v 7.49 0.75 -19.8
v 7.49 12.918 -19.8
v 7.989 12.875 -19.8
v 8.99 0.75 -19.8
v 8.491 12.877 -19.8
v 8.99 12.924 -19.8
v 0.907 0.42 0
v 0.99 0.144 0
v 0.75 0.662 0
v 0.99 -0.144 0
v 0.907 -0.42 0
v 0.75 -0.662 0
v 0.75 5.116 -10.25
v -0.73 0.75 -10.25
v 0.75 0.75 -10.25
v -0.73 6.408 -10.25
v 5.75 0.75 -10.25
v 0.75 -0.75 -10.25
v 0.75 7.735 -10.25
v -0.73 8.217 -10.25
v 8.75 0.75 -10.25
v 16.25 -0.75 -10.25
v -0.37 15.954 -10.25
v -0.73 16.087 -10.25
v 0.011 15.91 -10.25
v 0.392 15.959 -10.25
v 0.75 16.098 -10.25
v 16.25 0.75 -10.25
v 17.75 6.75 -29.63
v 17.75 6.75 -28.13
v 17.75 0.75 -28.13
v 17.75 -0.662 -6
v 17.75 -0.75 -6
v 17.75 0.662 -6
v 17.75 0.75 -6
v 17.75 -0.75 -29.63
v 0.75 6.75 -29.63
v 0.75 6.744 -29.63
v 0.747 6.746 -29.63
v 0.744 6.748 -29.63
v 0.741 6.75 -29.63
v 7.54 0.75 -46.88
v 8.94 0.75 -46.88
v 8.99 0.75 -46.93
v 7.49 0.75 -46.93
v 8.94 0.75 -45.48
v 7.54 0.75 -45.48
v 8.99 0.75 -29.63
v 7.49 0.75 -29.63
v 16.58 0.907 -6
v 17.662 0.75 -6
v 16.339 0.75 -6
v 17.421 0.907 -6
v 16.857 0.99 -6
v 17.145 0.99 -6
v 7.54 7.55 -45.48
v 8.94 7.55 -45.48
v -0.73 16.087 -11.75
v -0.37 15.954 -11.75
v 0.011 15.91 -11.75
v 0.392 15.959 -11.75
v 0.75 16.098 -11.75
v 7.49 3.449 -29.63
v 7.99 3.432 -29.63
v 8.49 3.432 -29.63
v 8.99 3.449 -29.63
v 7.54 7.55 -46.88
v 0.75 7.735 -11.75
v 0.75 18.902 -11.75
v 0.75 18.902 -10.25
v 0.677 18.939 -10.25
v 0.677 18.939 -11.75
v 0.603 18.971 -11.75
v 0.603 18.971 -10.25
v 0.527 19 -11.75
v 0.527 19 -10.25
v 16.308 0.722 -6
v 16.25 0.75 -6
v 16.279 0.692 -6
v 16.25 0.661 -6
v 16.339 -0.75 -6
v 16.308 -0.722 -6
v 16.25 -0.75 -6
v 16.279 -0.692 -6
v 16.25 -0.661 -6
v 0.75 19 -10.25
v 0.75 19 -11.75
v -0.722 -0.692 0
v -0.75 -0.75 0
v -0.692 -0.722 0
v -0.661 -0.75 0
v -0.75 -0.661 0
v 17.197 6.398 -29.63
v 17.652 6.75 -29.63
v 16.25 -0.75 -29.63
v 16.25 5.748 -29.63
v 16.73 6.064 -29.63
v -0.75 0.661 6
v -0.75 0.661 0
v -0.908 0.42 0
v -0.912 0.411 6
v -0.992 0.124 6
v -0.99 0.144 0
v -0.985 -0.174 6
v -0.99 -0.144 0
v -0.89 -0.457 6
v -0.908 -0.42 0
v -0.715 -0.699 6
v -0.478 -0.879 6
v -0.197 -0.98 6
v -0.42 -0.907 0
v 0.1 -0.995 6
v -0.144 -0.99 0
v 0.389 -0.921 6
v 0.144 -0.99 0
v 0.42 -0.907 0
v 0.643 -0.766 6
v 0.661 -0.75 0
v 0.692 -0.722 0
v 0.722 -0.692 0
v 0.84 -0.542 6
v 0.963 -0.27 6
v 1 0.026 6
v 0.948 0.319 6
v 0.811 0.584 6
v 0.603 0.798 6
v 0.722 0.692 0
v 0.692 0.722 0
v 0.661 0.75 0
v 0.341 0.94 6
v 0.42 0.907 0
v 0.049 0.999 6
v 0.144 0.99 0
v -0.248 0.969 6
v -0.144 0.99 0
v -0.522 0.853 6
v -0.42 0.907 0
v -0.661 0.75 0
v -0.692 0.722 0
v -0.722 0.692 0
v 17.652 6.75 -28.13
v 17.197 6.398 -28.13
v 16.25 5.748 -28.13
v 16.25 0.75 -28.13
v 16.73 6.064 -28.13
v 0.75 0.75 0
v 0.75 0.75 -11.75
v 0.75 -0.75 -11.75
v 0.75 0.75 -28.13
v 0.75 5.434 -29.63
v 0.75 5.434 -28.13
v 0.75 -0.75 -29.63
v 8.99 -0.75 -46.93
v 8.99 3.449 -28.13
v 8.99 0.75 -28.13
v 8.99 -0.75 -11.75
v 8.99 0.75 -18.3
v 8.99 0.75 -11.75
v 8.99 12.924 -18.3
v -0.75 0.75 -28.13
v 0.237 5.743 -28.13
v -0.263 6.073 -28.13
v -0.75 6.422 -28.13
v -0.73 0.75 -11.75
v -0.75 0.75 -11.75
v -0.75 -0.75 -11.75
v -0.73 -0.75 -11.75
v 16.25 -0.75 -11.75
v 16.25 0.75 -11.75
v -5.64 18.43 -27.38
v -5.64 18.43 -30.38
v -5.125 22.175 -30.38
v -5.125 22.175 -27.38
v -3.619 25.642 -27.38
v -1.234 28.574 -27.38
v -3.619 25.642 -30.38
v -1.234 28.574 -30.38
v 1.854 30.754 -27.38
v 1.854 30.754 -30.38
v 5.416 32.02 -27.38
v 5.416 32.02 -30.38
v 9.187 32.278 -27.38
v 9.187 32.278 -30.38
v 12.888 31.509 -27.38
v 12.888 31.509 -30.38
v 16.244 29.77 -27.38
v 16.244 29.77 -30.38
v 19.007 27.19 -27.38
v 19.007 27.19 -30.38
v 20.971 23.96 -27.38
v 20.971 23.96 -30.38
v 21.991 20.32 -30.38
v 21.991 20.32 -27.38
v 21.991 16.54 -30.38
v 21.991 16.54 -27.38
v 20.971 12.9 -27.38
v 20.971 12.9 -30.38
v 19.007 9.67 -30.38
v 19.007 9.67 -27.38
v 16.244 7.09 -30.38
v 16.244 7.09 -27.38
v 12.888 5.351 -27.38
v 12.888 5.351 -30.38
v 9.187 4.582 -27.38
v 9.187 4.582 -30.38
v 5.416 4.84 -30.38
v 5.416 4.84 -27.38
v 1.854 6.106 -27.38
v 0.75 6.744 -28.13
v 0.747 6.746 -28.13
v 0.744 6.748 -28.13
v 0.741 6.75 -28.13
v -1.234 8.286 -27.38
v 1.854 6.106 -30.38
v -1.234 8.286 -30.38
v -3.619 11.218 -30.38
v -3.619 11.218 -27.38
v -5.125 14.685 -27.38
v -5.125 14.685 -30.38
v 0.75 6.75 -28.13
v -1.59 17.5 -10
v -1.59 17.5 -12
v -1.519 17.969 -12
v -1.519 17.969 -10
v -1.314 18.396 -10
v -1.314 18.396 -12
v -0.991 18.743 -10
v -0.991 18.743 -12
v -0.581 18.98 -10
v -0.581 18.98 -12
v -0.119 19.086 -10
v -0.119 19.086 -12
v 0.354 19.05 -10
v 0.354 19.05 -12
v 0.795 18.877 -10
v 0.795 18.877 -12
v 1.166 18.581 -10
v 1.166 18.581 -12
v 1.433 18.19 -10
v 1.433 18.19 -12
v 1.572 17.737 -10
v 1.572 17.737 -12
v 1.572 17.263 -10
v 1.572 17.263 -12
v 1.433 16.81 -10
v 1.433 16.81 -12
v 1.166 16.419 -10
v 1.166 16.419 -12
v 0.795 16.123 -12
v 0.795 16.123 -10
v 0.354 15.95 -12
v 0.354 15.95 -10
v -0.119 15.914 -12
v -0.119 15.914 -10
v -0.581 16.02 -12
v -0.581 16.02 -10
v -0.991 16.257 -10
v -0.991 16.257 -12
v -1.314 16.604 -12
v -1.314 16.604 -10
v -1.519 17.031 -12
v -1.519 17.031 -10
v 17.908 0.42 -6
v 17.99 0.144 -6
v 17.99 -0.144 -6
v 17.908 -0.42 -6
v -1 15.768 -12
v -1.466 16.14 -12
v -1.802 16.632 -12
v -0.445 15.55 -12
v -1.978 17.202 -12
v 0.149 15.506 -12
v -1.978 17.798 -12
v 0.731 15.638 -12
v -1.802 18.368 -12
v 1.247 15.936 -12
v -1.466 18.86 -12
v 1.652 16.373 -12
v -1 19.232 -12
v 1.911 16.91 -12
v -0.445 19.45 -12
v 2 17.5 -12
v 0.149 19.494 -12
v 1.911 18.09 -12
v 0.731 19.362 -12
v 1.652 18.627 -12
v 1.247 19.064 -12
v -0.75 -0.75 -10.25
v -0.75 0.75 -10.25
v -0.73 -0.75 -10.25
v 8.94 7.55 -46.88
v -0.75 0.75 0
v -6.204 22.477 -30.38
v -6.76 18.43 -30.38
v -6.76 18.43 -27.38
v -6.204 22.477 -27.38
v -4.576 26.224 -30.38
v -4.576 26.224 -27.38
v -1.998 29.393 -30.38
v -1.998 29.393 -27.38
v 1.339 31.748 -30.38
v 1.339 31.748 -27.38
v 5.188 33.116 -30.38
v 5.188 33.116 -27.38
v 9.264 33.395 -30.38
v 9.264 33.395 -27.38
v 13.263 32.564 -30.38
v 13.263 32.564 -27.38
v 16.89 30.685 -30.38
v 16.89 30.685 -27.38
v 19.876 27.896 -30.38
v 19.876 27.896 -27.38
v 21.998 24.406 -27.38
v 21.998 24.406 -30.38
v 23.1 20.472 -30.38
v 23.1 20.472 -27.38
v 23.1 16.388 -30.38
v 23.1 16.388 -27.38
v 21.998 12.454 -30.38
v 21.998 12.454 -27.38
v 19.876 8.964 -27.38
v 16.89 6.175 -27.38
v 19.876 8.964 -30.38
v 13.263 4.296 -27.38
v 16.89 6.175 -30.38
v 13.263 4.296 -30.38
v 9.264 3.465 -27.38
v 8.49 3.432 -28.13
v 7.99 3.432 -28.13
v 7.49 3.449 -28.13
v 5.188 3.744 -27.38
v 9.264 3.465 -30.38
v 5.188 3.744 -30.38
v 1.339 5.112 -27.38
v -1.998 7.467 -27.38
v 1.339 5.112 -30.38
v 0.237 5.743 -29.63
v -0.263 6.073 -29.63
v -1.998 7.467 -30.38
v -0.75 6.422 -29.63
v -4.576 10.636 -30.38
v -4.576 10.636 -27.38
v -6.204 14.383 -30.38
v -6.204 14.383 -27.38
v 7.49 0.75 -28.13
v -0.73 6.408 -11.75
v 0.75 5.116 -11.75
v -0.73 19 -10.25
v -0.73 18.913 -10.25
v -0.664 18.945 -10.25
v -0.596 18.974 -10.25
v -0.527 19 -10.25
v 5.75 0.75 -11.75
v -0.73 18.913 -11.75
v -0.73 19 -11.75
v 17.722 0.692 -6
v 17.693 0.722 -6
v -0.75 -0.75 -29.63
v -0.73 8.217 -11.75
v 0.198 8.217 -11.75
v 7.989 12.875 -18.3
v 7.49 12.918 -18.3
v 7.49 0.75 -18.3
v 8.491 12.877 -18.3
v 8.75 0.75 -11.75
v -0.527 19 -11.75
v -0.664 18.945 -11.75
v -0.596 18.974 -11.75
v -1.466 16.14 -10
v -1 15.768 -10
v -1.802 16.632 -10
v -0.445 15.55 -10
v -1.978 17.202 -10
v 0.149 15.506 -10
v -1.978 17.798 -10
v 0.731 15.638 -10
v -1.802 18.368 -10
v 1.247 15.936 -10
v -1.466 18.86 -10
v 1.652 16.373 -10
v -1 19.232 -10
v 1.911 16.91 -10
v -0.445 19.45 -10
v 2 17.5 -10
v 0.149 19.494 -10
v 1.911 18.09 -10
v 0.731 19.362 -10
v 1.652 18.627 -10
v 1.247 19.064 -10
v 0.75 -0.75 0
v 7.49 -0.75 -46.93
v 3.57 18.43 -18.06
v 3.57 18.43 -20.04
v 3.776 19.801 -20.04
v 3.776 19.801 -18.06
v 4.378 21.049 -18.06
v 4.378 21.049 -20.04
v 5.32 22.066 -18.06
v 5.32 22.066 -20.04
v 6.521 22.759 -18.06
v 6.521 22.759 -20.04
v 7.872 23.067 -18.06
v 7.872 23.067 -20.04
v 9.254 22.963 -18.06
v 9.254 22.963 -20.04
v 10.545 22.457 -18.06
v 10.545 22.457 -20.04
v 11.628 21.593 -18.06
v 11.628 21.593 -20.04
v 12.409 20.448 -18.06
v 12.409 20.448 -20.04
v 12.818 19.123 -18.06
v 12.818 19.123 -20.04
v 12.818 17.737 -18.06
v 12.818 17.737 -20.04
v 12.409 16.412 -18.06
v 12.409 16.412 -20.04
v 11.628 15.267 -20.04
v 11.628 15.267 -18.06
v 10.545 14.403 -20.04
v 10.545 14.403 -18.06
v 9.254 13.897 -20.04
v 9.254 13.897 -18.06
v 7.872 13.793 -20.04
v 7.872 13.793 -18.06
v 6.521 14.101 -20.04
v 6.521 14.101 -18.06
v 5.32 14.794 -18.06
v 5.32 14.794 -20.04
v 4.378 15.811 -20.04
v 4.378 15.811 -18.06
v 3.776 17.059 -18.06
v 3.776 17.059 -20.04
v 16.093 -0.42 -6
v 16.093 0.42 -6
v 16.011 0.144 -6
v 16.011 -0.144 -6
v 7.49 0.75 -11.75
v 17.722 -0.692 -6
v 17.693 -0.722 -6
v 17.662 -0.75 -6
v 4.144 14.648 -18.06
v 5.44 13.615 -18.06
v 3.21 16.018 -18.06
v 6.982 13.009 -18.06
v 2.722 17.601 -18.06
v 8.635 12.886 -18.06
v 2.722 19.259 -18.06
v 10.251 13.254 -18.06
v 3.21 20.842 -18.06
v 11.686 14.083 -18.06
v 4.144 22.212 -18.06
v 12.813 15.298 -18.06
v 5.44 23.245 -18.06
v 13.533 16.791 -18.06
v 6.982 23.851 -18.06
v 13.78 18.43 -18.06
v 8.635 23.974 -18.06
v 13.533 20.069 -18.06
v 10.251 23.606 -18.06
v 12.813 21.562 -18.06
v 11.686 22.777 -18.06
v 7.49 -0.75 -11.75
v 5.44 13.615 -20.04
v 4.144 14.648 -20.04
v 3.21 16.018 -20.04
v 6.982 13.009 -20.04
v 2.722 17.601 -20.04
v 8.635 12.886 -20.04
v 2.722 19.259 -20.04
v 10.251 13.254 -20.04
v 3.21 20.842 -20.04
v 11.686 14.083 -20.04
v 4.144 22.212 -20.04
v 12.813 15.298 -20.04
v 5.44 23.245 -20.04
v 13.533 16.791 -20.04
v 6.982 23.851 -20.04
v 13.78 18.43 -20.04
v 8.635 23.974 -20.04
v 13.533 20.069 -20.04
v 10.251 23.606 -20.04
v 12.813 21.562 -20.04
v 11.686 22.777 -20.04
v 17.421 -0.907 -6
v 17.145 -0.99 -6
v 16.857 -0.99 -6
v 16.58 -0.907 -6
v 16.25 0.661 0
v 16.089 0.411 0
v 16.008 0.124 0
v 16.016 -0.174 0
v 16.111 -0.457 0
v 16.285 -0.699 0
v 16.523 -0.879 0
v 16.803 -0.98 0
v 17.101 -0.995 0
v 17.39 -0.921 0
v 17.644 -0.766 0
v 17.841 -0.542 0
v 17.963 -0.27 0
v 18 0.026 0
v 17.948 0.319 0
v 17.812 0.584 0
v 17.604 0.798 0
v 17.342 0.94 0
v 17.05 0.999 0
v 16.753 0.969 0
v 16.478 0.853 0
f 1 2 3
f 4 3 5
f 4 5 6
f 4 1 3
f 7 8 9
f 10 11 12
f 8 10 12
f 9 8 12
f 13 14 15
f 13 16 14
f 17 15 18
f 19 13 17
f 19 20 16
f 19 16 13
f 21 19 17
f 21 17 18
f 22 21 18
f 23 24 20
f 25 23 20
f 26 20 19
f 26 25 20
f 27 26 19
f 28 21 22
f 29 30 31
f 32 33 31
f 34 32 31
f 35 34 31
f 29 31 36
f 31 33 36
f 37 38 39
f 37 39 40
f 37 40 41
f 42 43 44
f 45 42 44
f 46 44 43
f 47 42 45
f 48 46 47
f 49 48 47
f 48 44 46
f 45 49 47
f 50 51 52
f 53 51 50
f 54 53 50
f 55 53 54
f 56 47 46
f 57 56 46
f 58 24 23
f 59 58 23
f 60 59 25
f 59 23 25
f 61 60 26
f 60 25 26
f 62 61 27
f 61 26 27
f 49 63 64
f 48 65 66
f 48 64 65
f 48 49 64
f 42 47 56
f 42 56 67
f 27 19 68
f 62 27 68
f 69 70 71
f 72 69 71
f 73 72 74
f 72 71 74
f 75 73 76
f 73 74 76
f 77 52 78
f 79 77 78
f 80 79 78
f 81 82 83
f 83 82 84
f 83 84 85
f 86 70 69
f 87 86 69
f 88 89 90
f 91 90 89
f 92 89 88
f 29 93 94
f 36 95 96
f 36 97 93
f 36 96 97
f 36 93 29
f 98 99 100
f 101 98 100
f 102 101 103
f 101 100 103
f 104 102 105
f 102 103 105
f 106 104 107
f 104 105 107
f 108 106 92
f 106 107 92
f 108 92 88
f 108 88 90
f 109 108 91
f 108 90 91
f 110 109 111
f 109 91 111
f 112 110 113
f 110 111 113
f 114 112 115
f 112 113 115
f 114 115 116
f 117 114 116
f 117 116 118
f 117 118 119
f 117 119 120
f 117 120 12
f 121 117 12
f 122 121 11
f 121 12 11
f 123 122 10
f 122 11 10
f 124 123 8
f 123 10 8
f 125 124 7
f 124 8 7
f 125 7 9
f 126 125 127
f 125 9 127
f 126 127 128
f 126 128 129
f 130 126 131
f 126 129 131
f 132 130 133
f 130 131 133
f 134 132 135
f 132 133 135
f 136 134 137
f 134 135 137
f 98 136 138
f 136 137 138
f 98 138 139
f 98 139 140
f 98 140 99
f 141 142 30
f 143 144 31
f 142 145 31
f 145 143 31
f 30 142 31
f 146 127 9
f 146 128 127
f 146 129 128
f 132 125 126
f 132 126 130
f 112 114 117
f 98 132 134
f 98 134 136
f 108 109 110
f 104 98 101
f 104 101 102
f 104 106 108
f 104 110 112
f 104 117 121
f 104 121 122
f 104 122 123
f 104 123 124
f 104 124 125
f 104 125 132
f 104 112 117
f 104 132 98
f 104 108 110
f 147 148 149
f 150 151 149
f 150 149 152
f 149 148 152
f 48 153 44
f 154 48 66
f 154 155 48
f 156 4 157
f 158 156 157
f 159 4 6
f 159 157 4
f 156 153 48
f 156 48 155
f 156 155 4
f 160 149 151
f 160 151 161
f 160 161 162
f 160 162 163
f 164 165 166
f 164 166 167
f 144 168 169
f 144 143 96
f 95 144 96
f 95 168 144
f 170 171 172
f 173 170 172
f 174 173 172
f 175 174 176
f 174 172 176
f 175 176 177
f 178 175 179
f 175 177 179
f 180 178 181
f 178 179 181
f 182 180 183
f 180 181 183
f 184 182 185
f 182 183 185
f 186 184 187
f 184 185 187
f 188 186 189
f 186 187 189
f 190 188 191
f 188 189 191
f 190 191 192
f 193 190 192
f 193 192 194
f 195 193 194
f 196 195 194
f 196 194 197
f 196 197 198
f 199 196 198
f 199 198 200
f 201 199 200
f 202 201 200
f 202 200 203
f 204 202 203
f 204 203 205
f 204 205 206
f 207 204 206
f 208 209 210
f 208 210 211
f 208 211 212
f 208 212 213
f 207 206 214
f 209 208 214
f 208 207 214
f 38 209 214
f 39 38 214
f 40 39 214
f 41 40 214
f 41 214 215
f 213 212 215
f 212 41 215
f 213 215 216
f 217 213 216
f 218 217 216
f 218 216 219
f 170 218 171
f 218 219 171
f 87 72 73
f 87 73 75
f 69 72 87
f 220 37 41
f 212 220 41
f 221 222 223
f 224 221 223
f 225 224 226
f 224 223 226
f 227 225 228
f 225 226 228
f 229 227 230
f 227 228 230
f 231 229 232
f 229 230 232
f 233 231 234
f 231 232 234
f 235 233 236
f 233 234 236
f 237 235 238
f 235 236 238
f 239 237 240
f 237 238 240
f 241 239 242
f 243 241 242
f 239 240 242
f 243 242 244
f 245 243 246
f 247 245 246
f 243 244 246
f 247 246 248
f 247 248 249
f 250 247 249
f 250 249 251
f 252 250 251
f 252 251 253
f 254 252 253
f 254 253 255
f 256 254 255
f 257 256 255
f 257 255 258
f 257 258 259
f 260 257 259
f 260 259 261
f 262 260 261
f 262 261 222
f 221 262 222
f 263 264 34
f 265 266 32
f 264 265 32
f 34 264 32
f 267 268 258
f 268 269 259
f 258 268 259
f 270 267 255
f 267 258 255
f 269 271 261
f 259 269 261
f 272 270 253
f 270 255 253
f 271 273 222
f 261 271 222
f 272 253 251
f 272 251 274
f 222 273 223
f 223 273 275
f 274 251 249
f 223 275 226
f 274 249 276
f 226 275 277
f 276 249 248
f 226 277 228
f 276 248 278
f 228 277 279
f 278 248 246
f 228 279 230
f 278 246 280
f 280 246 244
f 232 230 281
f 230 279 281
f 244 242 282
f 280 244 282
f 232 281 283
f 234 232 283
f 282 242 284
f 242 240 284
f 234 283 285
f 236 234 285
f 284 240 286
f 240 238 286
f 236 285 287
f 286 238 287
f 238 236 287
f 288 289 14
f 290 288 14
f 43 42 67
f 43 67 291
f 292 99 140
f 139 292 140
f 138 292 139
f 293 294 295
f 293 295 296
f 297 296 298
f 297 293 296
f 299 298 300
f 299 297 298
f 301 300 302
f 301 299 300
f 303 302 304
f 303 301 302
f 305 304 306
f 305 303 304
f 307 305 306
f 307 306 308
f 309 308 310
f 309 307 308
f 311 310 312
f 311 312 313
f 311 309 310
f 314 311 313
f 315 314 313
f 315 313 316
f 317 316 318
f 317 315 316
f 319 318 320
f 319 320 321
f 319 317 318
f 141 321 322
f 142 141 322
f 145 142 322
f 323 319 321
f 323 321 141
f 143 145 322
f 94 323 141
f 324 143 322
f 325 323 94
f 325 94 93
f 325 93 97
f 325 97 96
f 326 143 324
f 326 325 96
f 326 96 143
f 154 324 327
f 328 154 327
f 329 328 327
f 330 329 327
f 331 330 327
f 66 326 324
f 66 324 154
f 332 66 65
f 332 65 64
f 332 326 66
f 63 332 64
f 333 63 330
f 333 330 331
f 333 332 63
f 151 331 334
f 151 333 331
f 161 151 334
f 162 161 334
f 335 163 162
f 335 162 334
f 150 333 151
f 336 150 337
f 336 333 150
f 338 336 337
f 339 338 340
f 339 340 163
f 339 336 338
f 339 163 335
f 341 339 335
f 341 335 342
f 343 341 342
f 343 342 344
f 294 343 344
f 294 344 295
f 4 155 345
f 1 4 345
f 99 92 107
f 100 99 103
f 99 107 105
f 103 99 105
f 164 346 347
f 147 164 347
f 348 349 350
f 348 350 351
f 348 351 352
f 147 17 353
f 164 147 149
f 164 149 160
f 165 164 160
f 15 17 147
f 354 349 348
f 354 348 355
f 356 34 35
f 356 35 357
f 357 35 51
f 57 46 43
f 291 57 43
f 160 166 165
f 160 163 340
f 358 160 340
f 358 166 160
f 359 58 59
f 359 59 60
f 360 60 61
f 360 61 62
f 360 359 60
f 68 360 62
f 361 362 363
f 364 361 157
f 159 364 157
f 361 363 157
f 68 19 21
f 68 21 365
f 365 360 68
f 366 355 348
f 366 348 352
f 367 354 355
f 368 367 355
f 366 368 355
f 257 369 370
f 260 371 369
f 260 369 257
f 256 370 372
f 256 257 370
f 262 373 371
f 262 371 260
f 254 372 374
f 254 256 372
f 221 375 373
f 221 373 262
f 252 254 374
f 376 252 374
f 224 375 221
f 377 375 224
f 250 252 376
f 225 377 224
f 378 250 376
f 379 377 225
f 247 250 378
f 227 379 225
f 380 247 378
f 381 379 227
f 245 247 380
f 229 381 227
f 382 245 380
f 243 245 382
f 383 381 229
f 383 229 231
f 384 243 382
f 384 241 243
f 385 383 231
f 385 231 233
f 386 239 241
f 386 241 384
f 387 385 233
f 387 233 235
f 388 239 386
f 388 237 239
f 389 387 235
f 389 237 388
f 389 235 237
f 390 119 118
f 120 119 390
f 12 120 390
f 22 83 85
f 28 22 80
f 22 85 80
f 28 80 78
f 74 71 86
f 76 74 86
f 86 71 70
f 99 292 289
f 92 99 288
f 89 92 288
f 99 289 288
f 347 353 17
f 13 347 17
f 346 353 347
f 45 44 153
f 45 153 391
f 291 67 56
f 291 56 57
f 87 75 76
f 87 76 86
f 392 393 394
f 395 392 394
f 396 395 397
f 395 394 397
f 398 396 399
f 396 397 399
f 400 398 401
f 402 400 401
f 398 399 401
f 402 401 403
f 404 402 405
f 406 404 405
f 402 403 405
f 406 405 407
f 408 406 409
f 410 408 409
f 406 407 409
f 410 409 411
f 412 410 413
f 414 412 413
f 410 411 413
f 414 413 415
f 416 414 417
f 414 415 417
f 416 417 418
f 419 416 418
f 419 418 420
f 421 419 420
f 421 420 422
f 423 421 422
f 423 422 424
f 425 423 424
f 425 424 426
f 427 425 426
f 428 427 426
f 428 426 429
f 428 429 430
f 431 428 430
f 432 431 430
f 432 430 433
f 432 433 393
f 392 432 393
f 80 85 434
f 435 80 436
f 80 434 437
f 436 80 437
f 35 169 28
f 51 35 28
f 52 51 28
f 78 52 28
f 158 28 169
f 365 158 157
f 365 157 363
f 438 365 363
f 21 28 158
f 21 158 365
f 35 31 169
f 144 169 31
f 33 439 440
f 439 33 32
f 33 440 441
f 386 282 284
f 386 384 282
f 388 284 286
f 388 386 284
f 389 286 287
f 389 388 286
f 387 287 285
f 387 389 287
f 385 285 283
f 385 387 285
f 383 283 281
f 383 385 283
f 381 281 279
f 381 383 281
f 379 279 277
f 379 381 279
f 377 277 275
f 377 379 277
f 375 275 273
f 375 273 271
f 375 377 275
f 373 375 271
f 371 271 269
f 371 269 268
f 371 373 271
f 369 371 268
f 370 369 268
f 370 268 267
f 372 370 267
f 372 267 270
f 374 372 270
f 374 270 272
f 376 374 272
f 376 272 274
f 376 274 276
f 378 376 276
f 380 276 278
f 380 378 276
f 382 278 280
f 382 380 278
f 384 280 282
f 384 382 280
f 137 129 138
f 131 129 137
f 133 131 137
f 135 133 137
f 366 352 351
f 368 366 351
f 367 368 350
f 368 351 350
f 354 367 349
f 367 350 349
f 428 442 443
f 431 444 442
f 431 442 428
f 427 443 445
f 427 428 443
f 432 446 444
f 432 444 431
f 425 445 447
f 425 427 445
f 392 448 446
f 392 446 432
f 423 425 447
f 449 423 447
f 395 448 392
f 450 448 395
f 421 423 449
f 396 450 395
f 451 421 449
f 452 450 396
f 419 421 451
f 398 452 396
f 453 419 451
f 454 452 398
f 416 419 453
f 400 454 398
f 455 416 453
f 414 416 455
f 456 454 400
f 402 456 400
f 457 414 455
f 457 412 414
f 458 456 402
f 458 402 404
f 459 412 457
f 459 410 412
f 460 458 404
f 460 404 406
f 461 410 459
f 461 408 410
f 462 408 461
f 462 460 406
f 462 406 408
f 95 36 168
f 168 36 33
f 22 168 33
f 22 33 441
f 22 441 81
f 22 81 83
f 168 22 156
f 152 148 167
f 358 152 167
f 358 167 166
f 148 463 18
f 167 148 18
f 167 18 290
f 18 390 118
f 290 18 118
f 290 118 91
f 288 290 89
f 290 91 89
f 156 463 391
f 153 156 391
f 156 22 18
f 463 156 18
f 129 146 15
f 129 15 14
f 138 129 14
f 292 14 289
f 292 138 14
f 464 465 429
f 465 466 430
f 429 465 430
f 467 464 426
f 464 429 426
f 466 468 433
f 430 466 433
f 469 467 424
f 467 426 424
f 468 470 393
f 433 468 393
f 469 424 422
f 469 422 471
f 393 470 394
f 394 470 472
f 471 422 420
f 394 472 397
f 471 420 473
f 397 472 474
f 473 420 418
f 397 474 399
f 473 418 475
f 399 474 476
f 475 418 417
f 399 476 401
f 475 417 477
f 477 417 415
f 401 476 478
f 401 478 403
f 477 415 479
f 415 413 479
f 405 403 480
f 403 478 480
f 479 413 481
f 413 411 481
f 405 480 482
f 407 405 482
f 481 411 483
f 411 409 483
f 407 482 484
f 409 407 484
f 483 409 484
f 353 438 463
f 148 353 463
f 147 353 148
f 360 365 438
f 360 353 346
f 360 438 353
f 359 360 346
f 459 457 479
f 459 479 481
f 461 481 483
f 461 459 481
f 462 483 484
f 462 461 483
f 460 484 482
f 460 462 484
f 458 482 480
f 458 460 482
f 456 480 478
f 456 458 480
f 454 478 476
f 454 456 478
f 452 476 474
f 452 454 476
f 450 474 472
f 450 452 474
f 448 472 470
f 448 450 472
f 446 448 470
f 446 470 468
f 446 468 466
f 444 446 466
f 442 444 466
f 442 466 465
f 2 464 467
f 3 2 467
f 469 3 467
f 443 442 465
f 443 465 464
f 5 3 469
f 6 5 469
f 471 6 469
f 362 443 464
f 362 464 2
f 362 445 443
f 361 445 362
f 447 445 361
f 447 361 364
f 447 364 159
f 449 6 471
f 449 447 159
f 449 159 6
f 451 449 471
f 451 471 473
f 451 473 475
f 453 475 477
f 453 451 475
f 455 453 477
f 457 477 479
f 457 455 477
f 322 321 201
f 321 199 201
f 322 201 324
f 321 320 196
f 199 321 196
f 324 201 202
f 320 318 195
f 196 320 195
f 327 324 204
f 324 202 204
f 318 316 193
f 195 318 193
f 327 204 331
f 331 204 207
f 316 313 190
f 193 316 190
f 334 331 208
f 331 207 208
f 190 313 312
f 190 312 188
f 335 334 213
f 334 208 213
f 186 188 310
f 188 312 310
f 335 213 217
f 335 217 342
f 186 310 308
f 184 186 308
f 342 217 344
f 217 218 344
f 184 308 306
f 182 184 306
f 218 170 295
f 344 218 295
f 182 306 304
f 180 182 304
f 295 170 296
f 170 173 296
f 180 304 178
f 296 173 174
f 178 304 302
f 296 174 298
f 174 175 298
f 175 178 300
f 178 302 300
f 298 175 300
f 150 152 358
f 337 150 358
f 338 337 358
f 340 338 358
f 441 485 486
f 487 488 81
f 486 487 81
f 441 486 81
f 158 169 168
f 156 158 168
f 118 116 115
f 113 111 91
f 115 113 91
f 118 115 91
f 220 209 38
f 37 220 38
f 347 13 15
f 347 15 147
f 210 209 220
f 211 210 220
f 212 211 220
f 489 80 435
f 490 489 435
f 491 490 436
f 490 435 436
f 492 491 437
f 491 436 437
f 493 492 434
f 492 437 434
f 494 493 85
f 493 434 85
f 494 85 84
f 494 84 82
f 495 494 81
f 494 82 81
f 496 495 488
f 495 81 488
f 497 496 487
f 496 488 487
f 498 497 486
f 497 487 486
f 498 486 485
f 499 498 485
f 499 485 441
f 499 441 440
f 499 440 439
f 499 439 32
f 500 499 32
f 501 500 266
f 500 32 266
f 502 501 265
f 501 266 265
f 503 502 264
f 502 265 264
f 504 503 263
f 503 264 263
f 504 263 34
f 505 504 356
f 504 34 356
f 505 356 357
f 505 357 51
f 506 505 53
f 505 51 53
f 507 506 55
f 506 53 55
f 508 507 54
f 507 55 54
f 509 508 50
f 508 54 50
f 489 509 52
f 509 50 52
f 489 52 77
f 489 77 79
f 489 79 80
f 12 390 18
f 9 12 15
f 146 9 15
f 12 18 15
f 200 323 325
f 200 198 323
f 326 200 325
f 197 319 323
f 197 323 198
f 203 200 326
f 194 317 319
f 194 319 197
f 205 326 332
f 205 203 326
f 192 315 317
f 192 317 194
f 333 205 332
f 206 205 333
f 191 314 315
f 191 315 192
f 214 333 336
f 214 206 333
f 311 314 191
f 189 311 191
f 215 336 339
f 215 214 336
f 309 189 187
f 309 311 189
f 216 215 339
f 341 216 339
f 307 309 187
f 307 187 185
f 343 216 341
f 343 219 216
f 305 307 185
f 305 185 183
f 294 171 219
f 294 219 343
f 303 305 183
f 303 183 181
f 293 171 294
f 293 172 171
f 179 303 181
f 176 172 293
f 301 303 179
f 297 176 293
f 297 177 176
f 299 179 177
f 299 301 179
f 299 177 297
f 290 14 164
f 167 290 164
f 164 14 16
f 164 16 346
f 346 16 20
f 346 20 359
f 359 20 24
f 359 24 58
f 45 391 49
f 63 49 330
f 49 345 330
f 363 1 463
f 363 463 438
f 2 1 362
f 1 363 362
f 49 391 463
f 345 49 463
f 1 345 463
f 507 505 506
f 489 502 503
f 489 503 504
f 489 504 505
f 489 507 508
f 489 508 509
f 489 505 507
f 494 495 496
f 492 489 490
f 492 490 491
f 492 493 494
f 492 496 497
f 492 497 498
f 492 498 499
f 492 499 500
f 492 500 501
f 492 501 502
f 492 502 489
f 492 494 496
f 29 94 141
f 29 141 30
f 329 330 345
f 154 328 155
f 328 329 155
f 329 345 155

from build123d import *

# Parameters (mm, degrees)
SKETCH3_W            = 1.5
SKETCH3_H            = 1.5
SKETCH7_W            = 1.479410264
SKETCH7_H            = 1.499410264
BOSS_EXTRUDE1_DEPTH  = 19
SKETCH12_R           = 2
BOSS_EXTRUDE4_DEPTH  = 1
SKETCH16_R           = 1.59
CUT_EXTRUDE1_DEPTH   = 10
SKETCH17_R           = 1
BOSS_EXTRUDE5_DEPTH  = 6
SKETCH18_R           = 1
BOSS_EXTRUDE6_DEPTH  = 6
SKETCH19_W           = 1.5
SKETCH19_H           = 1.5
BOSS_EXTRUDE7_DEPTH  = 8.05
SKETCH21_W           = 1.5
SKETCH21_H           = 1.5
BOSS_EXTRUDE8_DEPTH  = 17.68
SKETCH22_R           = 5.56
BOSS_EXTRUDE9_DEPTH  = 0.99
SKETCH23_R           = 4.65
CUT_EXTRUDE2_DEPTH   = 5
SKETCH24_W           = 1.5
SKETCH24_H           = 1.5
BOSS_EXTRUDE10_DEPTH = 9.83
SKETCH25_W           = 1.5
SKETCH25_H           = 1.5
BOSS_EXTRUDE11_DEPTH = 3
SKETCH27_R           = 15
BOSS_EXTRUDE12_DEPTH = 1.5
SKETCH28_R           = 13.88
CUT_EXTRUDE3_DEPTH   = 3
SKETCH30_R           = 1.59
CUT_EXTRUDE5_DEPTH   = 3
SKETCH31_W           = 1.5
SKETCH31_H           = 1.5
BOSS_EXTRUDE13_DEPTH = 17.3
SKETCH32_W           = 1.4
SKETCH32_H           = 1.4
BOSS_EXTRUDE14_DEPTH = 6.8
SKETCH33_W           = 1.5
SKETCH33_H           = 1.5
BOSS_EXTRUDE15_DEPTH = 17.88
SKETCH34_W           = 1.5
SKETCH34_H           = 1.5
BOSS_EXTRUDE16_DEPTH = 6
SKETCH36_W           = 3
SKETCH36_H           = 1.5
SKETCH40_W           = 2.072351247
SKETCH40_H           = 1.5
CUT_EXTRUDE6_DEPTH   = 17.13


with BuildPart() as part:
    # Sweep3: sweep along a path in Sketch4
    with BuildLine(Plane(origin=(0, 0, 0), x_dir=(1, 0, 0), z_dir=(0, 1, 0))) as sweep3_path:
        Line((0, 0), (0, 11))
        Line((0, 11), (17, 11))
        Line((17, 11), (17, 6))
    # Sketch3 → Sweep3 (sweep)
    with BuildSketch(Plane.XY):
        with Locations((-0.000294868, 0)):
            Rectangle(SKETCH3_W, SKETCH3_H)
    sweep(path=sweep3_path.line, transition=Transition.RIGHT)

    # Sketch7 → Boss-Extrude1 (add)
    with BuildSketch(Plane(origin=(0, 0, 0), x_dir=(1, 0, 0), z_dir=(0, 1, 0))):
        with Locations((0.01, 11)):
            Rectangle(SKETCH7_W, SKETCH7_H)
    extrude(amount=BOSS_EXTRUDE1_DEPTH)

    # Sketch17 → Boss-Extrude5 (add)
    with BuildSketch(Plane.XY):
        with Locations(Location((0, 0, 0), (0, 0, 138.615926737))):
            Circle(SKETCH17_R)
    extrude(amount=BOSS_EXTRUDE5_DEPTH)

    # Sketch18 → Boss-Extrude6 (add)
    with BuildSketch(Plane.XY.offset(-6)):
        with Locations(Location((17.000589736, 0, 0), (0, 0, 138.615926737))):
            Circle(SKETCH18_R)
    extrude(amount=BOSS_EXTRUDE6_DEPTH)

    # Sketch30 → Cut-Extrude5 (cut)
    with BuildSketch(Plane.XY.offset(-10)):
        with Locations(Location((0, 17.5, 0), (0, 0, 180))):
            Circle(SKETCH30_R)
    extrude(amount=-CUT_EXTRUDE5_DEPTH, mode=Mode.SUBTRACT)


with BuildPart() as body_2:
    # Sketch12 → Boss-Extrude4 (new, symmetric)
    with BuildSketch(Plane.XY.offset(-11)):
        with Locations((0, 17.5)):
            Circle(SKETCH12_R)
    extrude(amount=BOSS_EXTRUDE4_DEPTH, both=True)

    # Sketch16 → Cut-Extrude1 (cut)
    with BuildSketch(Plane(origin=(0, 0, -12), x_dir=(-1, 0, 0), z_dir=(0, 0, -1))):
        with Locations((0, 17.5)):
            Circle(SKETCH16_R)
    extrude(amount=-CUT_EXTRUDE1_DEPTH, mode=Mode.SUBTRACT)


with BuildPart() as body_3:
    # Sketch19 → Boss-Extrude7 (new body)
    with BuildSketch(Plane.XY.offset(-11.75)):
        with Locations((8.24, 0)):
            Rectangle(SKETCH19_W, SKETCH19_H)
    extrude(amount=-BOSS_EXTRUDE7_DEPTH)

    # Sketch21 → Boss-Extrude8 (add)
    with BuildSketch(Plane(origin=(0, 0.75, 0), x_dir=(1, 0, 0), z_dir=(0, 1, 0))):
        with Locations((8.24, 19.05)):
            Rectangle(SKETCH21_W, SKETCH21_H)
    extrude(amount=BOSS_EXTRUDE8_DEPTH)

    # Sketch22 → Boss-Extrude9 (add, symmetric)
    with BuildSketch(Plane.XY.offset(-19.05)):
        with Locations((8.219571099, 18.429988197)):
            Circle(SKETCH22_R)
    extrude(amount=BOSS_EXTRUDE9_DEPTH, both=True)

    # Sketch23 → Cut-Extrude2 (cut)
    with BuildSketch(Plane(origin=(0, 0, -20.04), x_dir=(-1, 0, 0), z_dir=(0, 0, -1))):
        with Locations((-8.219571099, 18.429988197)):
            Circle(SKETCH23_R)
    extrude(amount=-CUT_EXTRUDE2_DEPTH, mode=Mode.SUBTRACT)

    # Sketch24 → Boss-Extrude10 (add)
    with BuildSketch(Plane(origin=(0, 0, -19.8), x_dir=(-1, 0, 0), z_dir=(0, 0, -1))):
        with Locations((-8.24, 0)):
            Rectangle(SKETCH24_W, SKETCH24_H)
    extrude(amount=BOSS_EXTRUDE10_DEPTH)

    # Sketch25 → Boss-Extrude11 (add)
    with BuildSketch(Plane(origin=(0, 0.75, 0), x_dir=(1, 0, 0), z_dir=(0, 1, 0))):
        with Locations((8.24, 28.88)):
            Rectangle(SKETCH25_W, SKETCH25_H)
    extrude(amount=BOSS_EXTRUDE11_DEPTH)

    # Sketch27 → Boss-Extrude12 (add, symmetric)
    with BuildSketch(Plane(origin=(0, 0, -28.88), x_dir=(-1, 0, 0), z_dir=(0, 0, -1))):
        with Locations((-8.24, 18.43)):
            Circle(SKETCH27_R)
    extrude(amount=BOSS_EXTRUDE12_DEPTH, both=True)

    # Sketch28 → Cut-Extrude3 (cut)
    with BuildSketch(Plane(origin=(0, 0, -30.38), x_dir=(-1, 0, 0), z_dir=(0, 0, -1))):
        with Locations((-8.24, 18.43)):
            Circle(SKETCH28_R)
    extrude(amount=-CUT_EXTRUDE3_DEPTH, mode=Mode.SUBTRACT)

    # Sketch31 → Boss-Extrude13 (add)
    with BuildSketch(Plane(origin=(0, 0, -29.63), x_dir=(-1, 0, 0), z_dir=(0, 0, -1))):
        with Locations((-8.24, 0)):
            Rectangle(SKETCH31_W, SKETCH31_H)
    extrude(amount=BOSS_EXTRUDE13_DEPTH)

    # Sketch32 → Boss-Extrude14 (add)
    with BuildSketch(Plane(origin=(0, 0.75, 0), x_dir=(1, 0, 0), z_dir=(0, 1, 0))):
        with Locations((8.24, 46.18)):
            Rectangle(SKETCH32_W, SKETCH32_H)
    extrude(amount=BOSS_EXTRUDE14_DEPTH)


with BuildPart() as cut_extrude5_piece_1:
    # of the separate pieces the step leaves, piece 1, a body of its own (cut_extrude5_pieces)
    add(part.part.solids().sort_by_distance((0.749705132, 0.75, 0))[0])


    add(body_3.part)  # Boss-Extrude15 merges body 3
    # Sketch33 → Boss-Extrude15 (add)
    with BuildSketch(Plane(origin=(0, 0, -11.750294868), x_dir=(-1, 0, 0), z_dir=(0, 0, -1))):
        with Locations((-17.000294868, 0)):
            Rectangle(SKETCH33_W, SKETCH33_H)
    boss_extrude15 = extrude(amount=BOSS_EXTRUDE15_DEPTH)

    # Sketch34 → Boss-Extrude16 (add)
    with BuildSketch(Plane(origin=(0, 0.75, 0), x_dir=(1, 0, 0), z_dir=(0, 1, 0))):
        with Locations((17.000294868, 28.880294868)):
            Rectangle(SKETCH34_W, SKETCH34_H)
    boss_extrude16 = extrude(amount=BOSS_EXTRUDE16_DEPTH)

    # Mirror1: Boss-Extrude15, Boss-Extrude16 across plane
    add(boss_extrude15.mirror(Plane.ZY.offset(-8.500294868)))
    add(boss_extrude16.mirror(Plane.ZY.offset(-8.500294868)))

    # Sweep4: sweep along a path in Sketch39
    with BuildLine(Plane.XY.offset(-11.000294868)) as sweep4_path:
        Line((8.24, 0.75), (-0.31176151, 8.217084581))
    # Sketch36 → Sweep4 (sweep)
    with BuildSketch(Plane(origin=(0, 0.75, 0), x_dir=(1, 0, 0), z_dir=(0, 1, 0))):
        with Locations((7.249705132, 11.000294868)):
            Rectangle(SKETCH36_W, SKETCH36_H)
    sweep(path=sweep4_path.line)

    # Sketch40 → Cut-Extrude6 (cut)
    with BuildSketch(Plane(origin=(0, 8.217084581, 0), x_dir=(1, 0, 0), z_dir=(0, 1, 0))):
        with Locations((-1.765880756, 11.000294868)):
            Rectangle(SKETCH40_W, SKETCH40_H)
    extrude(amount=-CUT_EXTRUDE6_DEPTH, mode=Mode.SUBTRACT)


with BuildPart() as cut_extrude5_piece_2:
    # of the separate pieces the step leaves, piece 2, a body of its own (cut_extrude5_pieces)
    add(part.part.solids().sort_by_distance((0.749705132, 18.902156273, -10.250294868))[0])


with BuildPart() as cut_extrude5_piece_3:
    # of the separate pieces the step leaves, piece 3, a body of its own (cut_extrude5_pieces)
    add(part.part.solids().sort_by_distance((-0.729705132, 18.912667838, -10.250294868))[0])


solid = Compound([body_2.part, cut_extrude5_piece_1.part, cut_extrude5_piece_2.part, cut_extrude5_piece_3.part])
